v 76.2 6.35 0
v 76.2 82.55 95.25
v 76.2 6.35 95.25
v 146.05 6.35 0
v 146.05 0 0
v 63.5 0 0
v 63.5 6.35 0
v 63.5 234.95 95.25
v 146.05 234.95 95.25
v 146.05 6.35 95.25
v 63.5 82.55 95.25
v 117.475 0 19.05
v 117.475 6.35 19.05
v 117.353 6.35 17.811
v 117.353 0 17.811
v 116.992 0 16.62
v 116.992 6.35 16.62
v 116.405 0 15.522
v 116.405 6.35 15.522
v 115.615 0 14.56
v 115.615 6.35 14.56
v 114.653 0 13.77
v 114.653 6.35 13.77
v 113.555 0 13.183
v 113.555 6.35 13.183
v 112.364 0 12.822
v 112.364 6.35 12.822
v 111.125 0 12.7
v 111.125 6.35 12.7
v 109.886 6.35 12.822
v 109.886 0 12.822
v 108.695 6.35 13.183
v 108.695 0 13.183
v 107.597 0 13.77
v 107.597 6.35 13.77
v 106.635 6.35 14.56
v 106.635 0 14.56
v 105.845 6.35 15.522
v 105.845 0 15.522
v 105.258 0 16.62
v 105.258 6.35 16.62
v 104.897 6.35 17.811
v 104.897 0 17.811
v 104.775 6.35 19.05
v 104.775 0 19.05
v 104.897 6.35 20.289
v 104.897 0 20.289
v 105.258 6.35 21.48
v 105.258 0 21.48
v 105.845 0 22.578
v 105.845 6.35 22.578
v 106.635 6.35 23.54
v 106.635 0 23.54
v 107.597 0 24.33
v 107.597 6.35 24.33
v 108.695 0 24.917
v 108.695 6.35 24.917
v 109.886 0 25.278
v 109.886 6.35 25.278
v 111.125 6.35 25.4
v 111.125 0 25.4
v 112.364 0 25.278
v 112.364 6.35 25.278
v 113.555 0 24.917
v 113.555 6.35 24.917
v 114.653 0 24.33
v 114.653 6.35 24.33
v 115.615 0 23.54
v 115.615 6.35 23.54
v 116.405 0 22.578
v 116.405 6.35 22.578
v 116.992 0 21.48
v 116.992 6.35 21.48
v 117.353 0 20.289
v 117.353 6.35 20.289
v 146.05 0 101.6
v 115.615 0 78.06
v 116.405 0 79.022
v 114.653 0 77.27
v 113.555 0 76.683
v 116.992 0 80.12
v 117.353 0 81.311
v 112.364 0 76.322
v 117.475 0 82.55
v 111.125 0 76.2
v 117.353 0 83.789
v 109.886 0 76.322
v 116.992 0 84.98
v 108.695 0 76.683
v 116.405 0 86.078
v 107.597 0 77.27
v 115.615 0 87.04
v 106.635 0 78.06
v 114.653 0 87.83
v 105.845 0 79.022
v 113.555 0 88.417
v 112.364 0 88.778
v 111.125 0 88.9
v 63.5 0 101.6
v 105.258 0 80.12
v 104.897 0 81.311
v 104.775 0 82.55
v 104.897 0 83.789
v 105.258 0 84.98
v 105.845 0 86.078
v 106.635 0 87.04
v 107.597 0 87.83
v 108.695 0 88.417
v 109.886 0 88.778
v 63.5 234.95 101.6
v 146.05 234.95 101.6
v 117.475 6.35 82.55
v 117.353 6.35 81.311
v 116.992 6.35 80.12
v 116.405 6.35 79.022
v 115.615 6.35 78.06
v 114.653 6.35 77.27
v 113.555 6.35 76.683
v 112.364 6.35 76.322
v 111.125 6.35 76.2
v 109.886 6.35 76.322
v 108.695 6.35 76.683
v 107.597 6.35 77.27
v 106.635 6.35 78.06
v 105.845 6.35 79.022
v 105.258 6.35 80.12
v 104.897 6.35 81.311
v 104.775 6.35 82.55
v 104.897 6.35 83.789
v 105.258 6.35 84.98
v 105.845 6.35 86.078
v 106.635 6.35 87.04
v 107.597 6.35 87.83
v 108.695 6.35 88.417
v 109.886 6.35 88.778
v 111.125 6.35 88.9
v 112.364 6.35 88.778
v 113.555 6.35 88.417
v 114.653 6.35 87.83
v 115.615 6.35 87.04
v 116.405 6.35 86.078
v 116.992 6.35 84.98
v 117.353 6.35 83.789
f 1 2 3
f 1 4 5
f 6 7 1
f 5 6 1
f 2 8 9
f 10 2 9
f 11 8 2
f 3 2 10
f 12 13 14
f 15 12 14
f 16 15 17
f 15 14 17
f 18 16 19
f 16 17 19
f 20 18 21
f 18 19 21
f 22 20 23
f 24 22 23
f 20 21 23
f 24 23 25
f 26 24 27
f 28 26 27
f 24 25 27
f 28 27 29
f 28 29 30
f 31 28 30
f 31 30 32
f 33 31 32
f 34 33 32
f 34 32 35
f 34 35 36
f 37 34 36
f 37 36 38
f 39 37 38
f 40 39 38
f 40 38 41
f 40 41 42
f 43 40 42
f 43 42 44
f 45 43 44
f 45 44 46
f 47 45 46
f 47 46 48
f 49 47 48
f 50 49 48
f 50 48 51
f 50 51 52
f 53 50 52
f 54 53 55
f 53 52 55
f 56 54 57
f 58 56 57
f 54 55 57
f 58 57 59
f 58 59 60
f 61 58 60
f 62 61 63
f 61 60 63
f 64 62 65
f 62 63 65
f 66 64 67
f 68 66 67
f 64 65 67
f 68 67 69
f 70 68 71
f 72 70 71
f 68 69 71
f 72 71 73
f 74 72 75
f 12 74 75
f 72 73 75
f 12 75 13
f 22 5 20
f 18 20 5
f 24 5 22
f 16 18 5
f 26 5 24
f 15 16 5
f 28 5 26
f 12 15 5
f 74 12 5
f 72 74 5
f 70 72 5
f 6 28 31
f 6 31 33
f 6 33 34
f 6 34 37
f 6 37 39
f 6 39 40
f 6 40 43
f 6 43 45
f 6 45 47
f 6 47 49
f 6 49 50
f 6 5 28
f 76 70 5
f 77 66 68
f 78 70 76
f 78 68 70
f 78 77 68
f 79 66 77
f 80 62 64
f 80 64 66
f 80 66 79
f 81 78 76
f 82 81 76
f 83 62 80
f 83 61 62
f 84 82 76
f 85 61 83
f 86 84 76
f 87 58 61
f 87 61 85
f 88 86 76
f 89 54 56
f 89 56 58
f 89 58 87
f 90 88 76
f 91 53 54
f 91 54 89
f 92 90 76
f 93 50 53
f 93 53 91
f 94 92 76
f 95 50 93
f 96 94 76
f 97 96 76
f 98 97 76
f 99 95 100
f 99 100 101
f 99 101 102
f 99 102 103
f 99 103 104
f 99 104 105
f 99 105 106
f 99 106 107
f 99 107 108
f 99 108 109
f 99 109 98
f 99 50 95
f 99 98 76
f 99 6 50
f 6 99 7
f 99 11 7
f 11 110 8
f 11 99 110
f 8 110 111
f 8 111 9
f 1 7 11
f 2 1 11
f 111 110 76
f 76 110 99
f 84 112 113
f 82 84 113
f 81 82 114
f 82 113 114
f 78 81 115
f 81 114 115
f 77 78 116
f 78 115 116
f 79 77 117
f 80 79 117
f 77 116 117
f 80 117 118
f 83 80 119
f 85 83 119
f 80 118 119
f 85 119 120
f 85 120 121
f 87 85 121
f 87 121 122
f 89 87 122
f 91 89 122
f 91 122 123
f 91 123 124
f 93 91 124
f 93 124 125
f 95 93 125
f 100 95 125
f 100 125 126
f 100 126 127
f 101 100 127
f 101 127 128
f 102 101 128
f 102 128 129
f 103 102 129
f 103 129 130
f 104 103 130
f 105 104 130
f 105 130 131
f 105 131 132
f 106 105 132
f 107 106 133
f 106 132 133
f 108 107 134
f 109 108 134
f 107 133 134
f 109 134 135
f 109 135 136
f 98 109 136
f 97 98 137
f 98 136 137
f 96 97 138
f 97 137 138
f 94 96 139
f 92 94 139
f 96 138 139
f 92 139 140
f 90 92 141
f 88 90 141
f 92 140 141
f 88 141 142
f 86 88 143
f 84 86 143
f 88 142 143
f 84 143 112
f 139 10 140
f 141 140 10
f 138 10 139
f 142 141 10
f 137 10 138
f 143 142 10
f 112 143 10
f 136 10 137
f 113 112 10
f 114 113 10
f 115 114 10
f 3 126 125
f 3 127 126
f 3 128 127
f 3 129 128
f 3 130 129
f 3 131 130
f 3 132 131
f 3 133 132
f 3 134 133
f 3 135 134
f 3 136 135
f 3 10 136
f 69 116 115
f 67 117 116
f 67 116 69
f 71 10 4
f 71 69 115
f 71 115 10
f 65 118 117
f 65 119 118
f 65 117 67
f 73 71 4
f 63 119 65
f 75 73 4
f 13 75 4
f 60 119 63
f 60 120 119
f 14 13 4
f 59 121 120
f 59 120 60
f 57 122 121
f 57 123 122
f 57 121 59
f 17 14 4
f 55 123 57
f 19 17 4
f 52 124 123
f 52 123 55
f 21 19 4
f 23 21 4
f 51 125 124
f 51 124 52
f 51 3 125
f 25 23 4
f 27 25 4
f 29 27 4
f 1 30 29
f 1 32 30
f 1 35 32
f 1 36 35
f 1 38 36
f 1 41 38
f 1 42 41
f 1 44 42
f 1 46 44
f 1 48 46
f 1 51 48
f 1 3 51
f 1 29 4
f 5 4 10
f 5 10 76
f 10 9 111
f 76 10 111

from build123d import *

# Parameters (mm, degrees)
BOSS_EXTRUDE1_DEPTH = 146.05
SKETCH2_W           = 63.5
SKETCH2_H           = 234.95
CUT_EXTRUDE1_DEPTH  = 146.05
BOSS_EXTRUDE2_DEPTH = 12.7
SKETCH4_R           = 6.35
CUT_EXTRUDE2_DEPTH  = 12.7


with BuildPart() as part:
    # Sketch1 → Boss-Extrude1 (new body)
    with BuildSketch(Plane(origin=(0, 0, 0), x_dir=(0, 0, -1), z_dir=(1, 0, 0))):
        Polygon((0, 0), (-101.6, 0), (-101.6, 6.35), (-101.6, 234.95), (-95.25, 234.95), (-95.25, 6.35), (0, 6.35), align=None)
    extrude(amount=BOSS_EXTRUDE1_DEPTH)

    # Sketch2 → Cut-Extrude1 (cut)
    with BuildSketch(Plane.XY.offset(101.6)):
        with Locations((31.75, 117.475)):
            Rectangle(SKETCH2_W, SKETCH2_H)
    extrude(amount=-CUT_EXTRUDE1_DEPTH, mode=Mode.SUBTRACT)

    # Sketch3 → Boss-Extrude2 (add)
    with BuildSketch(Plane.ZY.offset(-63.5)):
        Polygon((0, 6.35), (95.25, 82.55), (95.25, 6.35), align=None)
    extrude(amount=-BOSS_EXTRUDE2_DEPTH)

    # Sketch4 → Cut-Extrude2 (cut)
    with BuildSketch(Plane(origin=(0, 6.35, 0), x_dir=(1, 0, 0), z_dir=(0, 1, 0))):
        with Locations((111.125, -19.05)):
            Circle(SKETCH4_R)
        with Locations((111.125, -82.55)):
            Circle(SKETCH4_R)
    extrude(amount=-CUT_EXTRUDE2_DEPTH, mode=Mode.SUBTRACT)


solid = part.part
